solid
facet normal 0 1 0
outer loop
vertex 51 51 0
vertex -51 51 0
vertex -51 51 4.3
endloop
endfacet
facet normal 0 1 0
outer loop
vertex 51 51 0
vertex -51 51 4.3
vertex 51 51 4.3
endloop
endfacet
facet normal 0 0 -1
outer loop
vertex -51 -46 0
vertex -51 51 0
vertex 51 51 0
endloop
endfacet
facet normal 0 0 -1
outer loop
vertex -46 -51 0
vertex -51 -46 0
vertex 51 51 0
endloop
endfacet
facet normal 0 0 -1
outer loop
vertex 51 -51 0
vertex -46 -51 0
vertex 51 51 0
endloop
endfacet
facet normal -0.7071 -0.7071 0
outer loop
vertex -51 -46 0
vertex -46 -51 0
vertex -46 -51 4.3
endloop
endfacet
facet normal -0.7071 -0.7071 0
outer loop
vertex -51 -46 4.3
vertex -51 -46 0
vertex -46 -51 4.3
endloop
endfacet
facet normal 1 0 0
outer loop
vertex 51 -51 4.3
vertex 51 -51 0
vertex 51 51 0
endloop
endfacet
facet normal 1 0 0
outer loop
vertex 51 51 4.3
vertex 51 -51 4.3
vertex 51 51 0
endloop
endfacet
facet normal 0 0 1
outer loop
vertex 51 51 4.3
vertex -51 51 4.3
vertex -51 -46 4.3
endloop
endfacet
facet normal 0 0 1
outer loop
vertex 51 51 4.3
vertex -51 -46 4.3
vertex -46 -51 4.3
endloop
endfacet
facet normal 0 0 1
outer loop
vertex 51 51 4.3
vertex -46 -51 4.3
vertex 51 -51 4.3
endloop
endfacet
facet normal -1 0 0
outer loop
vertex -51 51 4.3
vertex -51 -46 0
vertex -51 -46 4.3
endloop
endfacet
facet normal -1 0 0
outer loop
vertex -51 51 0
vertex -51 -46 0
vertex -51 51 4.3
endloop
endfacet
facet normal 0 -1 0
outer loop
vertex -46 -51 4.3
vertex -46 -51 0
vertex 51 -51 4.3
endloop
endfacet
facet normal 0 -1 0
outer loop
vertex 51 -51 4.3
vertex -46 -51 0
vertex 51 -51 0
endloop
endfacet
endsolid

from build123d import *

# Parameters (mm, degrees)
SKETCH_1_W      = 102
SKETCH_1_H      = 102
EXTRUDE_1_DEPTH = 4.3
CHAMFER_1_SIZE  = 5


with BuildPart() as part:
    # 草图1 → 凸台-拉伸1 (new body)
    with BuildSketch(Plane.XY):
        Rectangle(SKETCH_1_W, SKETCH_1_H)
    extrude(amount=EXTRUDE_1_DEPTH)

    # 倒角1
    chamfer_1_edges = [part.edges().sort_by_distance(p)[0] for p in [
        (-51, -51, 2.15),
    ]]
    chamfer(chamfer_1_edges, length=CHAMFER_1_SIZE)


solid = part.part
